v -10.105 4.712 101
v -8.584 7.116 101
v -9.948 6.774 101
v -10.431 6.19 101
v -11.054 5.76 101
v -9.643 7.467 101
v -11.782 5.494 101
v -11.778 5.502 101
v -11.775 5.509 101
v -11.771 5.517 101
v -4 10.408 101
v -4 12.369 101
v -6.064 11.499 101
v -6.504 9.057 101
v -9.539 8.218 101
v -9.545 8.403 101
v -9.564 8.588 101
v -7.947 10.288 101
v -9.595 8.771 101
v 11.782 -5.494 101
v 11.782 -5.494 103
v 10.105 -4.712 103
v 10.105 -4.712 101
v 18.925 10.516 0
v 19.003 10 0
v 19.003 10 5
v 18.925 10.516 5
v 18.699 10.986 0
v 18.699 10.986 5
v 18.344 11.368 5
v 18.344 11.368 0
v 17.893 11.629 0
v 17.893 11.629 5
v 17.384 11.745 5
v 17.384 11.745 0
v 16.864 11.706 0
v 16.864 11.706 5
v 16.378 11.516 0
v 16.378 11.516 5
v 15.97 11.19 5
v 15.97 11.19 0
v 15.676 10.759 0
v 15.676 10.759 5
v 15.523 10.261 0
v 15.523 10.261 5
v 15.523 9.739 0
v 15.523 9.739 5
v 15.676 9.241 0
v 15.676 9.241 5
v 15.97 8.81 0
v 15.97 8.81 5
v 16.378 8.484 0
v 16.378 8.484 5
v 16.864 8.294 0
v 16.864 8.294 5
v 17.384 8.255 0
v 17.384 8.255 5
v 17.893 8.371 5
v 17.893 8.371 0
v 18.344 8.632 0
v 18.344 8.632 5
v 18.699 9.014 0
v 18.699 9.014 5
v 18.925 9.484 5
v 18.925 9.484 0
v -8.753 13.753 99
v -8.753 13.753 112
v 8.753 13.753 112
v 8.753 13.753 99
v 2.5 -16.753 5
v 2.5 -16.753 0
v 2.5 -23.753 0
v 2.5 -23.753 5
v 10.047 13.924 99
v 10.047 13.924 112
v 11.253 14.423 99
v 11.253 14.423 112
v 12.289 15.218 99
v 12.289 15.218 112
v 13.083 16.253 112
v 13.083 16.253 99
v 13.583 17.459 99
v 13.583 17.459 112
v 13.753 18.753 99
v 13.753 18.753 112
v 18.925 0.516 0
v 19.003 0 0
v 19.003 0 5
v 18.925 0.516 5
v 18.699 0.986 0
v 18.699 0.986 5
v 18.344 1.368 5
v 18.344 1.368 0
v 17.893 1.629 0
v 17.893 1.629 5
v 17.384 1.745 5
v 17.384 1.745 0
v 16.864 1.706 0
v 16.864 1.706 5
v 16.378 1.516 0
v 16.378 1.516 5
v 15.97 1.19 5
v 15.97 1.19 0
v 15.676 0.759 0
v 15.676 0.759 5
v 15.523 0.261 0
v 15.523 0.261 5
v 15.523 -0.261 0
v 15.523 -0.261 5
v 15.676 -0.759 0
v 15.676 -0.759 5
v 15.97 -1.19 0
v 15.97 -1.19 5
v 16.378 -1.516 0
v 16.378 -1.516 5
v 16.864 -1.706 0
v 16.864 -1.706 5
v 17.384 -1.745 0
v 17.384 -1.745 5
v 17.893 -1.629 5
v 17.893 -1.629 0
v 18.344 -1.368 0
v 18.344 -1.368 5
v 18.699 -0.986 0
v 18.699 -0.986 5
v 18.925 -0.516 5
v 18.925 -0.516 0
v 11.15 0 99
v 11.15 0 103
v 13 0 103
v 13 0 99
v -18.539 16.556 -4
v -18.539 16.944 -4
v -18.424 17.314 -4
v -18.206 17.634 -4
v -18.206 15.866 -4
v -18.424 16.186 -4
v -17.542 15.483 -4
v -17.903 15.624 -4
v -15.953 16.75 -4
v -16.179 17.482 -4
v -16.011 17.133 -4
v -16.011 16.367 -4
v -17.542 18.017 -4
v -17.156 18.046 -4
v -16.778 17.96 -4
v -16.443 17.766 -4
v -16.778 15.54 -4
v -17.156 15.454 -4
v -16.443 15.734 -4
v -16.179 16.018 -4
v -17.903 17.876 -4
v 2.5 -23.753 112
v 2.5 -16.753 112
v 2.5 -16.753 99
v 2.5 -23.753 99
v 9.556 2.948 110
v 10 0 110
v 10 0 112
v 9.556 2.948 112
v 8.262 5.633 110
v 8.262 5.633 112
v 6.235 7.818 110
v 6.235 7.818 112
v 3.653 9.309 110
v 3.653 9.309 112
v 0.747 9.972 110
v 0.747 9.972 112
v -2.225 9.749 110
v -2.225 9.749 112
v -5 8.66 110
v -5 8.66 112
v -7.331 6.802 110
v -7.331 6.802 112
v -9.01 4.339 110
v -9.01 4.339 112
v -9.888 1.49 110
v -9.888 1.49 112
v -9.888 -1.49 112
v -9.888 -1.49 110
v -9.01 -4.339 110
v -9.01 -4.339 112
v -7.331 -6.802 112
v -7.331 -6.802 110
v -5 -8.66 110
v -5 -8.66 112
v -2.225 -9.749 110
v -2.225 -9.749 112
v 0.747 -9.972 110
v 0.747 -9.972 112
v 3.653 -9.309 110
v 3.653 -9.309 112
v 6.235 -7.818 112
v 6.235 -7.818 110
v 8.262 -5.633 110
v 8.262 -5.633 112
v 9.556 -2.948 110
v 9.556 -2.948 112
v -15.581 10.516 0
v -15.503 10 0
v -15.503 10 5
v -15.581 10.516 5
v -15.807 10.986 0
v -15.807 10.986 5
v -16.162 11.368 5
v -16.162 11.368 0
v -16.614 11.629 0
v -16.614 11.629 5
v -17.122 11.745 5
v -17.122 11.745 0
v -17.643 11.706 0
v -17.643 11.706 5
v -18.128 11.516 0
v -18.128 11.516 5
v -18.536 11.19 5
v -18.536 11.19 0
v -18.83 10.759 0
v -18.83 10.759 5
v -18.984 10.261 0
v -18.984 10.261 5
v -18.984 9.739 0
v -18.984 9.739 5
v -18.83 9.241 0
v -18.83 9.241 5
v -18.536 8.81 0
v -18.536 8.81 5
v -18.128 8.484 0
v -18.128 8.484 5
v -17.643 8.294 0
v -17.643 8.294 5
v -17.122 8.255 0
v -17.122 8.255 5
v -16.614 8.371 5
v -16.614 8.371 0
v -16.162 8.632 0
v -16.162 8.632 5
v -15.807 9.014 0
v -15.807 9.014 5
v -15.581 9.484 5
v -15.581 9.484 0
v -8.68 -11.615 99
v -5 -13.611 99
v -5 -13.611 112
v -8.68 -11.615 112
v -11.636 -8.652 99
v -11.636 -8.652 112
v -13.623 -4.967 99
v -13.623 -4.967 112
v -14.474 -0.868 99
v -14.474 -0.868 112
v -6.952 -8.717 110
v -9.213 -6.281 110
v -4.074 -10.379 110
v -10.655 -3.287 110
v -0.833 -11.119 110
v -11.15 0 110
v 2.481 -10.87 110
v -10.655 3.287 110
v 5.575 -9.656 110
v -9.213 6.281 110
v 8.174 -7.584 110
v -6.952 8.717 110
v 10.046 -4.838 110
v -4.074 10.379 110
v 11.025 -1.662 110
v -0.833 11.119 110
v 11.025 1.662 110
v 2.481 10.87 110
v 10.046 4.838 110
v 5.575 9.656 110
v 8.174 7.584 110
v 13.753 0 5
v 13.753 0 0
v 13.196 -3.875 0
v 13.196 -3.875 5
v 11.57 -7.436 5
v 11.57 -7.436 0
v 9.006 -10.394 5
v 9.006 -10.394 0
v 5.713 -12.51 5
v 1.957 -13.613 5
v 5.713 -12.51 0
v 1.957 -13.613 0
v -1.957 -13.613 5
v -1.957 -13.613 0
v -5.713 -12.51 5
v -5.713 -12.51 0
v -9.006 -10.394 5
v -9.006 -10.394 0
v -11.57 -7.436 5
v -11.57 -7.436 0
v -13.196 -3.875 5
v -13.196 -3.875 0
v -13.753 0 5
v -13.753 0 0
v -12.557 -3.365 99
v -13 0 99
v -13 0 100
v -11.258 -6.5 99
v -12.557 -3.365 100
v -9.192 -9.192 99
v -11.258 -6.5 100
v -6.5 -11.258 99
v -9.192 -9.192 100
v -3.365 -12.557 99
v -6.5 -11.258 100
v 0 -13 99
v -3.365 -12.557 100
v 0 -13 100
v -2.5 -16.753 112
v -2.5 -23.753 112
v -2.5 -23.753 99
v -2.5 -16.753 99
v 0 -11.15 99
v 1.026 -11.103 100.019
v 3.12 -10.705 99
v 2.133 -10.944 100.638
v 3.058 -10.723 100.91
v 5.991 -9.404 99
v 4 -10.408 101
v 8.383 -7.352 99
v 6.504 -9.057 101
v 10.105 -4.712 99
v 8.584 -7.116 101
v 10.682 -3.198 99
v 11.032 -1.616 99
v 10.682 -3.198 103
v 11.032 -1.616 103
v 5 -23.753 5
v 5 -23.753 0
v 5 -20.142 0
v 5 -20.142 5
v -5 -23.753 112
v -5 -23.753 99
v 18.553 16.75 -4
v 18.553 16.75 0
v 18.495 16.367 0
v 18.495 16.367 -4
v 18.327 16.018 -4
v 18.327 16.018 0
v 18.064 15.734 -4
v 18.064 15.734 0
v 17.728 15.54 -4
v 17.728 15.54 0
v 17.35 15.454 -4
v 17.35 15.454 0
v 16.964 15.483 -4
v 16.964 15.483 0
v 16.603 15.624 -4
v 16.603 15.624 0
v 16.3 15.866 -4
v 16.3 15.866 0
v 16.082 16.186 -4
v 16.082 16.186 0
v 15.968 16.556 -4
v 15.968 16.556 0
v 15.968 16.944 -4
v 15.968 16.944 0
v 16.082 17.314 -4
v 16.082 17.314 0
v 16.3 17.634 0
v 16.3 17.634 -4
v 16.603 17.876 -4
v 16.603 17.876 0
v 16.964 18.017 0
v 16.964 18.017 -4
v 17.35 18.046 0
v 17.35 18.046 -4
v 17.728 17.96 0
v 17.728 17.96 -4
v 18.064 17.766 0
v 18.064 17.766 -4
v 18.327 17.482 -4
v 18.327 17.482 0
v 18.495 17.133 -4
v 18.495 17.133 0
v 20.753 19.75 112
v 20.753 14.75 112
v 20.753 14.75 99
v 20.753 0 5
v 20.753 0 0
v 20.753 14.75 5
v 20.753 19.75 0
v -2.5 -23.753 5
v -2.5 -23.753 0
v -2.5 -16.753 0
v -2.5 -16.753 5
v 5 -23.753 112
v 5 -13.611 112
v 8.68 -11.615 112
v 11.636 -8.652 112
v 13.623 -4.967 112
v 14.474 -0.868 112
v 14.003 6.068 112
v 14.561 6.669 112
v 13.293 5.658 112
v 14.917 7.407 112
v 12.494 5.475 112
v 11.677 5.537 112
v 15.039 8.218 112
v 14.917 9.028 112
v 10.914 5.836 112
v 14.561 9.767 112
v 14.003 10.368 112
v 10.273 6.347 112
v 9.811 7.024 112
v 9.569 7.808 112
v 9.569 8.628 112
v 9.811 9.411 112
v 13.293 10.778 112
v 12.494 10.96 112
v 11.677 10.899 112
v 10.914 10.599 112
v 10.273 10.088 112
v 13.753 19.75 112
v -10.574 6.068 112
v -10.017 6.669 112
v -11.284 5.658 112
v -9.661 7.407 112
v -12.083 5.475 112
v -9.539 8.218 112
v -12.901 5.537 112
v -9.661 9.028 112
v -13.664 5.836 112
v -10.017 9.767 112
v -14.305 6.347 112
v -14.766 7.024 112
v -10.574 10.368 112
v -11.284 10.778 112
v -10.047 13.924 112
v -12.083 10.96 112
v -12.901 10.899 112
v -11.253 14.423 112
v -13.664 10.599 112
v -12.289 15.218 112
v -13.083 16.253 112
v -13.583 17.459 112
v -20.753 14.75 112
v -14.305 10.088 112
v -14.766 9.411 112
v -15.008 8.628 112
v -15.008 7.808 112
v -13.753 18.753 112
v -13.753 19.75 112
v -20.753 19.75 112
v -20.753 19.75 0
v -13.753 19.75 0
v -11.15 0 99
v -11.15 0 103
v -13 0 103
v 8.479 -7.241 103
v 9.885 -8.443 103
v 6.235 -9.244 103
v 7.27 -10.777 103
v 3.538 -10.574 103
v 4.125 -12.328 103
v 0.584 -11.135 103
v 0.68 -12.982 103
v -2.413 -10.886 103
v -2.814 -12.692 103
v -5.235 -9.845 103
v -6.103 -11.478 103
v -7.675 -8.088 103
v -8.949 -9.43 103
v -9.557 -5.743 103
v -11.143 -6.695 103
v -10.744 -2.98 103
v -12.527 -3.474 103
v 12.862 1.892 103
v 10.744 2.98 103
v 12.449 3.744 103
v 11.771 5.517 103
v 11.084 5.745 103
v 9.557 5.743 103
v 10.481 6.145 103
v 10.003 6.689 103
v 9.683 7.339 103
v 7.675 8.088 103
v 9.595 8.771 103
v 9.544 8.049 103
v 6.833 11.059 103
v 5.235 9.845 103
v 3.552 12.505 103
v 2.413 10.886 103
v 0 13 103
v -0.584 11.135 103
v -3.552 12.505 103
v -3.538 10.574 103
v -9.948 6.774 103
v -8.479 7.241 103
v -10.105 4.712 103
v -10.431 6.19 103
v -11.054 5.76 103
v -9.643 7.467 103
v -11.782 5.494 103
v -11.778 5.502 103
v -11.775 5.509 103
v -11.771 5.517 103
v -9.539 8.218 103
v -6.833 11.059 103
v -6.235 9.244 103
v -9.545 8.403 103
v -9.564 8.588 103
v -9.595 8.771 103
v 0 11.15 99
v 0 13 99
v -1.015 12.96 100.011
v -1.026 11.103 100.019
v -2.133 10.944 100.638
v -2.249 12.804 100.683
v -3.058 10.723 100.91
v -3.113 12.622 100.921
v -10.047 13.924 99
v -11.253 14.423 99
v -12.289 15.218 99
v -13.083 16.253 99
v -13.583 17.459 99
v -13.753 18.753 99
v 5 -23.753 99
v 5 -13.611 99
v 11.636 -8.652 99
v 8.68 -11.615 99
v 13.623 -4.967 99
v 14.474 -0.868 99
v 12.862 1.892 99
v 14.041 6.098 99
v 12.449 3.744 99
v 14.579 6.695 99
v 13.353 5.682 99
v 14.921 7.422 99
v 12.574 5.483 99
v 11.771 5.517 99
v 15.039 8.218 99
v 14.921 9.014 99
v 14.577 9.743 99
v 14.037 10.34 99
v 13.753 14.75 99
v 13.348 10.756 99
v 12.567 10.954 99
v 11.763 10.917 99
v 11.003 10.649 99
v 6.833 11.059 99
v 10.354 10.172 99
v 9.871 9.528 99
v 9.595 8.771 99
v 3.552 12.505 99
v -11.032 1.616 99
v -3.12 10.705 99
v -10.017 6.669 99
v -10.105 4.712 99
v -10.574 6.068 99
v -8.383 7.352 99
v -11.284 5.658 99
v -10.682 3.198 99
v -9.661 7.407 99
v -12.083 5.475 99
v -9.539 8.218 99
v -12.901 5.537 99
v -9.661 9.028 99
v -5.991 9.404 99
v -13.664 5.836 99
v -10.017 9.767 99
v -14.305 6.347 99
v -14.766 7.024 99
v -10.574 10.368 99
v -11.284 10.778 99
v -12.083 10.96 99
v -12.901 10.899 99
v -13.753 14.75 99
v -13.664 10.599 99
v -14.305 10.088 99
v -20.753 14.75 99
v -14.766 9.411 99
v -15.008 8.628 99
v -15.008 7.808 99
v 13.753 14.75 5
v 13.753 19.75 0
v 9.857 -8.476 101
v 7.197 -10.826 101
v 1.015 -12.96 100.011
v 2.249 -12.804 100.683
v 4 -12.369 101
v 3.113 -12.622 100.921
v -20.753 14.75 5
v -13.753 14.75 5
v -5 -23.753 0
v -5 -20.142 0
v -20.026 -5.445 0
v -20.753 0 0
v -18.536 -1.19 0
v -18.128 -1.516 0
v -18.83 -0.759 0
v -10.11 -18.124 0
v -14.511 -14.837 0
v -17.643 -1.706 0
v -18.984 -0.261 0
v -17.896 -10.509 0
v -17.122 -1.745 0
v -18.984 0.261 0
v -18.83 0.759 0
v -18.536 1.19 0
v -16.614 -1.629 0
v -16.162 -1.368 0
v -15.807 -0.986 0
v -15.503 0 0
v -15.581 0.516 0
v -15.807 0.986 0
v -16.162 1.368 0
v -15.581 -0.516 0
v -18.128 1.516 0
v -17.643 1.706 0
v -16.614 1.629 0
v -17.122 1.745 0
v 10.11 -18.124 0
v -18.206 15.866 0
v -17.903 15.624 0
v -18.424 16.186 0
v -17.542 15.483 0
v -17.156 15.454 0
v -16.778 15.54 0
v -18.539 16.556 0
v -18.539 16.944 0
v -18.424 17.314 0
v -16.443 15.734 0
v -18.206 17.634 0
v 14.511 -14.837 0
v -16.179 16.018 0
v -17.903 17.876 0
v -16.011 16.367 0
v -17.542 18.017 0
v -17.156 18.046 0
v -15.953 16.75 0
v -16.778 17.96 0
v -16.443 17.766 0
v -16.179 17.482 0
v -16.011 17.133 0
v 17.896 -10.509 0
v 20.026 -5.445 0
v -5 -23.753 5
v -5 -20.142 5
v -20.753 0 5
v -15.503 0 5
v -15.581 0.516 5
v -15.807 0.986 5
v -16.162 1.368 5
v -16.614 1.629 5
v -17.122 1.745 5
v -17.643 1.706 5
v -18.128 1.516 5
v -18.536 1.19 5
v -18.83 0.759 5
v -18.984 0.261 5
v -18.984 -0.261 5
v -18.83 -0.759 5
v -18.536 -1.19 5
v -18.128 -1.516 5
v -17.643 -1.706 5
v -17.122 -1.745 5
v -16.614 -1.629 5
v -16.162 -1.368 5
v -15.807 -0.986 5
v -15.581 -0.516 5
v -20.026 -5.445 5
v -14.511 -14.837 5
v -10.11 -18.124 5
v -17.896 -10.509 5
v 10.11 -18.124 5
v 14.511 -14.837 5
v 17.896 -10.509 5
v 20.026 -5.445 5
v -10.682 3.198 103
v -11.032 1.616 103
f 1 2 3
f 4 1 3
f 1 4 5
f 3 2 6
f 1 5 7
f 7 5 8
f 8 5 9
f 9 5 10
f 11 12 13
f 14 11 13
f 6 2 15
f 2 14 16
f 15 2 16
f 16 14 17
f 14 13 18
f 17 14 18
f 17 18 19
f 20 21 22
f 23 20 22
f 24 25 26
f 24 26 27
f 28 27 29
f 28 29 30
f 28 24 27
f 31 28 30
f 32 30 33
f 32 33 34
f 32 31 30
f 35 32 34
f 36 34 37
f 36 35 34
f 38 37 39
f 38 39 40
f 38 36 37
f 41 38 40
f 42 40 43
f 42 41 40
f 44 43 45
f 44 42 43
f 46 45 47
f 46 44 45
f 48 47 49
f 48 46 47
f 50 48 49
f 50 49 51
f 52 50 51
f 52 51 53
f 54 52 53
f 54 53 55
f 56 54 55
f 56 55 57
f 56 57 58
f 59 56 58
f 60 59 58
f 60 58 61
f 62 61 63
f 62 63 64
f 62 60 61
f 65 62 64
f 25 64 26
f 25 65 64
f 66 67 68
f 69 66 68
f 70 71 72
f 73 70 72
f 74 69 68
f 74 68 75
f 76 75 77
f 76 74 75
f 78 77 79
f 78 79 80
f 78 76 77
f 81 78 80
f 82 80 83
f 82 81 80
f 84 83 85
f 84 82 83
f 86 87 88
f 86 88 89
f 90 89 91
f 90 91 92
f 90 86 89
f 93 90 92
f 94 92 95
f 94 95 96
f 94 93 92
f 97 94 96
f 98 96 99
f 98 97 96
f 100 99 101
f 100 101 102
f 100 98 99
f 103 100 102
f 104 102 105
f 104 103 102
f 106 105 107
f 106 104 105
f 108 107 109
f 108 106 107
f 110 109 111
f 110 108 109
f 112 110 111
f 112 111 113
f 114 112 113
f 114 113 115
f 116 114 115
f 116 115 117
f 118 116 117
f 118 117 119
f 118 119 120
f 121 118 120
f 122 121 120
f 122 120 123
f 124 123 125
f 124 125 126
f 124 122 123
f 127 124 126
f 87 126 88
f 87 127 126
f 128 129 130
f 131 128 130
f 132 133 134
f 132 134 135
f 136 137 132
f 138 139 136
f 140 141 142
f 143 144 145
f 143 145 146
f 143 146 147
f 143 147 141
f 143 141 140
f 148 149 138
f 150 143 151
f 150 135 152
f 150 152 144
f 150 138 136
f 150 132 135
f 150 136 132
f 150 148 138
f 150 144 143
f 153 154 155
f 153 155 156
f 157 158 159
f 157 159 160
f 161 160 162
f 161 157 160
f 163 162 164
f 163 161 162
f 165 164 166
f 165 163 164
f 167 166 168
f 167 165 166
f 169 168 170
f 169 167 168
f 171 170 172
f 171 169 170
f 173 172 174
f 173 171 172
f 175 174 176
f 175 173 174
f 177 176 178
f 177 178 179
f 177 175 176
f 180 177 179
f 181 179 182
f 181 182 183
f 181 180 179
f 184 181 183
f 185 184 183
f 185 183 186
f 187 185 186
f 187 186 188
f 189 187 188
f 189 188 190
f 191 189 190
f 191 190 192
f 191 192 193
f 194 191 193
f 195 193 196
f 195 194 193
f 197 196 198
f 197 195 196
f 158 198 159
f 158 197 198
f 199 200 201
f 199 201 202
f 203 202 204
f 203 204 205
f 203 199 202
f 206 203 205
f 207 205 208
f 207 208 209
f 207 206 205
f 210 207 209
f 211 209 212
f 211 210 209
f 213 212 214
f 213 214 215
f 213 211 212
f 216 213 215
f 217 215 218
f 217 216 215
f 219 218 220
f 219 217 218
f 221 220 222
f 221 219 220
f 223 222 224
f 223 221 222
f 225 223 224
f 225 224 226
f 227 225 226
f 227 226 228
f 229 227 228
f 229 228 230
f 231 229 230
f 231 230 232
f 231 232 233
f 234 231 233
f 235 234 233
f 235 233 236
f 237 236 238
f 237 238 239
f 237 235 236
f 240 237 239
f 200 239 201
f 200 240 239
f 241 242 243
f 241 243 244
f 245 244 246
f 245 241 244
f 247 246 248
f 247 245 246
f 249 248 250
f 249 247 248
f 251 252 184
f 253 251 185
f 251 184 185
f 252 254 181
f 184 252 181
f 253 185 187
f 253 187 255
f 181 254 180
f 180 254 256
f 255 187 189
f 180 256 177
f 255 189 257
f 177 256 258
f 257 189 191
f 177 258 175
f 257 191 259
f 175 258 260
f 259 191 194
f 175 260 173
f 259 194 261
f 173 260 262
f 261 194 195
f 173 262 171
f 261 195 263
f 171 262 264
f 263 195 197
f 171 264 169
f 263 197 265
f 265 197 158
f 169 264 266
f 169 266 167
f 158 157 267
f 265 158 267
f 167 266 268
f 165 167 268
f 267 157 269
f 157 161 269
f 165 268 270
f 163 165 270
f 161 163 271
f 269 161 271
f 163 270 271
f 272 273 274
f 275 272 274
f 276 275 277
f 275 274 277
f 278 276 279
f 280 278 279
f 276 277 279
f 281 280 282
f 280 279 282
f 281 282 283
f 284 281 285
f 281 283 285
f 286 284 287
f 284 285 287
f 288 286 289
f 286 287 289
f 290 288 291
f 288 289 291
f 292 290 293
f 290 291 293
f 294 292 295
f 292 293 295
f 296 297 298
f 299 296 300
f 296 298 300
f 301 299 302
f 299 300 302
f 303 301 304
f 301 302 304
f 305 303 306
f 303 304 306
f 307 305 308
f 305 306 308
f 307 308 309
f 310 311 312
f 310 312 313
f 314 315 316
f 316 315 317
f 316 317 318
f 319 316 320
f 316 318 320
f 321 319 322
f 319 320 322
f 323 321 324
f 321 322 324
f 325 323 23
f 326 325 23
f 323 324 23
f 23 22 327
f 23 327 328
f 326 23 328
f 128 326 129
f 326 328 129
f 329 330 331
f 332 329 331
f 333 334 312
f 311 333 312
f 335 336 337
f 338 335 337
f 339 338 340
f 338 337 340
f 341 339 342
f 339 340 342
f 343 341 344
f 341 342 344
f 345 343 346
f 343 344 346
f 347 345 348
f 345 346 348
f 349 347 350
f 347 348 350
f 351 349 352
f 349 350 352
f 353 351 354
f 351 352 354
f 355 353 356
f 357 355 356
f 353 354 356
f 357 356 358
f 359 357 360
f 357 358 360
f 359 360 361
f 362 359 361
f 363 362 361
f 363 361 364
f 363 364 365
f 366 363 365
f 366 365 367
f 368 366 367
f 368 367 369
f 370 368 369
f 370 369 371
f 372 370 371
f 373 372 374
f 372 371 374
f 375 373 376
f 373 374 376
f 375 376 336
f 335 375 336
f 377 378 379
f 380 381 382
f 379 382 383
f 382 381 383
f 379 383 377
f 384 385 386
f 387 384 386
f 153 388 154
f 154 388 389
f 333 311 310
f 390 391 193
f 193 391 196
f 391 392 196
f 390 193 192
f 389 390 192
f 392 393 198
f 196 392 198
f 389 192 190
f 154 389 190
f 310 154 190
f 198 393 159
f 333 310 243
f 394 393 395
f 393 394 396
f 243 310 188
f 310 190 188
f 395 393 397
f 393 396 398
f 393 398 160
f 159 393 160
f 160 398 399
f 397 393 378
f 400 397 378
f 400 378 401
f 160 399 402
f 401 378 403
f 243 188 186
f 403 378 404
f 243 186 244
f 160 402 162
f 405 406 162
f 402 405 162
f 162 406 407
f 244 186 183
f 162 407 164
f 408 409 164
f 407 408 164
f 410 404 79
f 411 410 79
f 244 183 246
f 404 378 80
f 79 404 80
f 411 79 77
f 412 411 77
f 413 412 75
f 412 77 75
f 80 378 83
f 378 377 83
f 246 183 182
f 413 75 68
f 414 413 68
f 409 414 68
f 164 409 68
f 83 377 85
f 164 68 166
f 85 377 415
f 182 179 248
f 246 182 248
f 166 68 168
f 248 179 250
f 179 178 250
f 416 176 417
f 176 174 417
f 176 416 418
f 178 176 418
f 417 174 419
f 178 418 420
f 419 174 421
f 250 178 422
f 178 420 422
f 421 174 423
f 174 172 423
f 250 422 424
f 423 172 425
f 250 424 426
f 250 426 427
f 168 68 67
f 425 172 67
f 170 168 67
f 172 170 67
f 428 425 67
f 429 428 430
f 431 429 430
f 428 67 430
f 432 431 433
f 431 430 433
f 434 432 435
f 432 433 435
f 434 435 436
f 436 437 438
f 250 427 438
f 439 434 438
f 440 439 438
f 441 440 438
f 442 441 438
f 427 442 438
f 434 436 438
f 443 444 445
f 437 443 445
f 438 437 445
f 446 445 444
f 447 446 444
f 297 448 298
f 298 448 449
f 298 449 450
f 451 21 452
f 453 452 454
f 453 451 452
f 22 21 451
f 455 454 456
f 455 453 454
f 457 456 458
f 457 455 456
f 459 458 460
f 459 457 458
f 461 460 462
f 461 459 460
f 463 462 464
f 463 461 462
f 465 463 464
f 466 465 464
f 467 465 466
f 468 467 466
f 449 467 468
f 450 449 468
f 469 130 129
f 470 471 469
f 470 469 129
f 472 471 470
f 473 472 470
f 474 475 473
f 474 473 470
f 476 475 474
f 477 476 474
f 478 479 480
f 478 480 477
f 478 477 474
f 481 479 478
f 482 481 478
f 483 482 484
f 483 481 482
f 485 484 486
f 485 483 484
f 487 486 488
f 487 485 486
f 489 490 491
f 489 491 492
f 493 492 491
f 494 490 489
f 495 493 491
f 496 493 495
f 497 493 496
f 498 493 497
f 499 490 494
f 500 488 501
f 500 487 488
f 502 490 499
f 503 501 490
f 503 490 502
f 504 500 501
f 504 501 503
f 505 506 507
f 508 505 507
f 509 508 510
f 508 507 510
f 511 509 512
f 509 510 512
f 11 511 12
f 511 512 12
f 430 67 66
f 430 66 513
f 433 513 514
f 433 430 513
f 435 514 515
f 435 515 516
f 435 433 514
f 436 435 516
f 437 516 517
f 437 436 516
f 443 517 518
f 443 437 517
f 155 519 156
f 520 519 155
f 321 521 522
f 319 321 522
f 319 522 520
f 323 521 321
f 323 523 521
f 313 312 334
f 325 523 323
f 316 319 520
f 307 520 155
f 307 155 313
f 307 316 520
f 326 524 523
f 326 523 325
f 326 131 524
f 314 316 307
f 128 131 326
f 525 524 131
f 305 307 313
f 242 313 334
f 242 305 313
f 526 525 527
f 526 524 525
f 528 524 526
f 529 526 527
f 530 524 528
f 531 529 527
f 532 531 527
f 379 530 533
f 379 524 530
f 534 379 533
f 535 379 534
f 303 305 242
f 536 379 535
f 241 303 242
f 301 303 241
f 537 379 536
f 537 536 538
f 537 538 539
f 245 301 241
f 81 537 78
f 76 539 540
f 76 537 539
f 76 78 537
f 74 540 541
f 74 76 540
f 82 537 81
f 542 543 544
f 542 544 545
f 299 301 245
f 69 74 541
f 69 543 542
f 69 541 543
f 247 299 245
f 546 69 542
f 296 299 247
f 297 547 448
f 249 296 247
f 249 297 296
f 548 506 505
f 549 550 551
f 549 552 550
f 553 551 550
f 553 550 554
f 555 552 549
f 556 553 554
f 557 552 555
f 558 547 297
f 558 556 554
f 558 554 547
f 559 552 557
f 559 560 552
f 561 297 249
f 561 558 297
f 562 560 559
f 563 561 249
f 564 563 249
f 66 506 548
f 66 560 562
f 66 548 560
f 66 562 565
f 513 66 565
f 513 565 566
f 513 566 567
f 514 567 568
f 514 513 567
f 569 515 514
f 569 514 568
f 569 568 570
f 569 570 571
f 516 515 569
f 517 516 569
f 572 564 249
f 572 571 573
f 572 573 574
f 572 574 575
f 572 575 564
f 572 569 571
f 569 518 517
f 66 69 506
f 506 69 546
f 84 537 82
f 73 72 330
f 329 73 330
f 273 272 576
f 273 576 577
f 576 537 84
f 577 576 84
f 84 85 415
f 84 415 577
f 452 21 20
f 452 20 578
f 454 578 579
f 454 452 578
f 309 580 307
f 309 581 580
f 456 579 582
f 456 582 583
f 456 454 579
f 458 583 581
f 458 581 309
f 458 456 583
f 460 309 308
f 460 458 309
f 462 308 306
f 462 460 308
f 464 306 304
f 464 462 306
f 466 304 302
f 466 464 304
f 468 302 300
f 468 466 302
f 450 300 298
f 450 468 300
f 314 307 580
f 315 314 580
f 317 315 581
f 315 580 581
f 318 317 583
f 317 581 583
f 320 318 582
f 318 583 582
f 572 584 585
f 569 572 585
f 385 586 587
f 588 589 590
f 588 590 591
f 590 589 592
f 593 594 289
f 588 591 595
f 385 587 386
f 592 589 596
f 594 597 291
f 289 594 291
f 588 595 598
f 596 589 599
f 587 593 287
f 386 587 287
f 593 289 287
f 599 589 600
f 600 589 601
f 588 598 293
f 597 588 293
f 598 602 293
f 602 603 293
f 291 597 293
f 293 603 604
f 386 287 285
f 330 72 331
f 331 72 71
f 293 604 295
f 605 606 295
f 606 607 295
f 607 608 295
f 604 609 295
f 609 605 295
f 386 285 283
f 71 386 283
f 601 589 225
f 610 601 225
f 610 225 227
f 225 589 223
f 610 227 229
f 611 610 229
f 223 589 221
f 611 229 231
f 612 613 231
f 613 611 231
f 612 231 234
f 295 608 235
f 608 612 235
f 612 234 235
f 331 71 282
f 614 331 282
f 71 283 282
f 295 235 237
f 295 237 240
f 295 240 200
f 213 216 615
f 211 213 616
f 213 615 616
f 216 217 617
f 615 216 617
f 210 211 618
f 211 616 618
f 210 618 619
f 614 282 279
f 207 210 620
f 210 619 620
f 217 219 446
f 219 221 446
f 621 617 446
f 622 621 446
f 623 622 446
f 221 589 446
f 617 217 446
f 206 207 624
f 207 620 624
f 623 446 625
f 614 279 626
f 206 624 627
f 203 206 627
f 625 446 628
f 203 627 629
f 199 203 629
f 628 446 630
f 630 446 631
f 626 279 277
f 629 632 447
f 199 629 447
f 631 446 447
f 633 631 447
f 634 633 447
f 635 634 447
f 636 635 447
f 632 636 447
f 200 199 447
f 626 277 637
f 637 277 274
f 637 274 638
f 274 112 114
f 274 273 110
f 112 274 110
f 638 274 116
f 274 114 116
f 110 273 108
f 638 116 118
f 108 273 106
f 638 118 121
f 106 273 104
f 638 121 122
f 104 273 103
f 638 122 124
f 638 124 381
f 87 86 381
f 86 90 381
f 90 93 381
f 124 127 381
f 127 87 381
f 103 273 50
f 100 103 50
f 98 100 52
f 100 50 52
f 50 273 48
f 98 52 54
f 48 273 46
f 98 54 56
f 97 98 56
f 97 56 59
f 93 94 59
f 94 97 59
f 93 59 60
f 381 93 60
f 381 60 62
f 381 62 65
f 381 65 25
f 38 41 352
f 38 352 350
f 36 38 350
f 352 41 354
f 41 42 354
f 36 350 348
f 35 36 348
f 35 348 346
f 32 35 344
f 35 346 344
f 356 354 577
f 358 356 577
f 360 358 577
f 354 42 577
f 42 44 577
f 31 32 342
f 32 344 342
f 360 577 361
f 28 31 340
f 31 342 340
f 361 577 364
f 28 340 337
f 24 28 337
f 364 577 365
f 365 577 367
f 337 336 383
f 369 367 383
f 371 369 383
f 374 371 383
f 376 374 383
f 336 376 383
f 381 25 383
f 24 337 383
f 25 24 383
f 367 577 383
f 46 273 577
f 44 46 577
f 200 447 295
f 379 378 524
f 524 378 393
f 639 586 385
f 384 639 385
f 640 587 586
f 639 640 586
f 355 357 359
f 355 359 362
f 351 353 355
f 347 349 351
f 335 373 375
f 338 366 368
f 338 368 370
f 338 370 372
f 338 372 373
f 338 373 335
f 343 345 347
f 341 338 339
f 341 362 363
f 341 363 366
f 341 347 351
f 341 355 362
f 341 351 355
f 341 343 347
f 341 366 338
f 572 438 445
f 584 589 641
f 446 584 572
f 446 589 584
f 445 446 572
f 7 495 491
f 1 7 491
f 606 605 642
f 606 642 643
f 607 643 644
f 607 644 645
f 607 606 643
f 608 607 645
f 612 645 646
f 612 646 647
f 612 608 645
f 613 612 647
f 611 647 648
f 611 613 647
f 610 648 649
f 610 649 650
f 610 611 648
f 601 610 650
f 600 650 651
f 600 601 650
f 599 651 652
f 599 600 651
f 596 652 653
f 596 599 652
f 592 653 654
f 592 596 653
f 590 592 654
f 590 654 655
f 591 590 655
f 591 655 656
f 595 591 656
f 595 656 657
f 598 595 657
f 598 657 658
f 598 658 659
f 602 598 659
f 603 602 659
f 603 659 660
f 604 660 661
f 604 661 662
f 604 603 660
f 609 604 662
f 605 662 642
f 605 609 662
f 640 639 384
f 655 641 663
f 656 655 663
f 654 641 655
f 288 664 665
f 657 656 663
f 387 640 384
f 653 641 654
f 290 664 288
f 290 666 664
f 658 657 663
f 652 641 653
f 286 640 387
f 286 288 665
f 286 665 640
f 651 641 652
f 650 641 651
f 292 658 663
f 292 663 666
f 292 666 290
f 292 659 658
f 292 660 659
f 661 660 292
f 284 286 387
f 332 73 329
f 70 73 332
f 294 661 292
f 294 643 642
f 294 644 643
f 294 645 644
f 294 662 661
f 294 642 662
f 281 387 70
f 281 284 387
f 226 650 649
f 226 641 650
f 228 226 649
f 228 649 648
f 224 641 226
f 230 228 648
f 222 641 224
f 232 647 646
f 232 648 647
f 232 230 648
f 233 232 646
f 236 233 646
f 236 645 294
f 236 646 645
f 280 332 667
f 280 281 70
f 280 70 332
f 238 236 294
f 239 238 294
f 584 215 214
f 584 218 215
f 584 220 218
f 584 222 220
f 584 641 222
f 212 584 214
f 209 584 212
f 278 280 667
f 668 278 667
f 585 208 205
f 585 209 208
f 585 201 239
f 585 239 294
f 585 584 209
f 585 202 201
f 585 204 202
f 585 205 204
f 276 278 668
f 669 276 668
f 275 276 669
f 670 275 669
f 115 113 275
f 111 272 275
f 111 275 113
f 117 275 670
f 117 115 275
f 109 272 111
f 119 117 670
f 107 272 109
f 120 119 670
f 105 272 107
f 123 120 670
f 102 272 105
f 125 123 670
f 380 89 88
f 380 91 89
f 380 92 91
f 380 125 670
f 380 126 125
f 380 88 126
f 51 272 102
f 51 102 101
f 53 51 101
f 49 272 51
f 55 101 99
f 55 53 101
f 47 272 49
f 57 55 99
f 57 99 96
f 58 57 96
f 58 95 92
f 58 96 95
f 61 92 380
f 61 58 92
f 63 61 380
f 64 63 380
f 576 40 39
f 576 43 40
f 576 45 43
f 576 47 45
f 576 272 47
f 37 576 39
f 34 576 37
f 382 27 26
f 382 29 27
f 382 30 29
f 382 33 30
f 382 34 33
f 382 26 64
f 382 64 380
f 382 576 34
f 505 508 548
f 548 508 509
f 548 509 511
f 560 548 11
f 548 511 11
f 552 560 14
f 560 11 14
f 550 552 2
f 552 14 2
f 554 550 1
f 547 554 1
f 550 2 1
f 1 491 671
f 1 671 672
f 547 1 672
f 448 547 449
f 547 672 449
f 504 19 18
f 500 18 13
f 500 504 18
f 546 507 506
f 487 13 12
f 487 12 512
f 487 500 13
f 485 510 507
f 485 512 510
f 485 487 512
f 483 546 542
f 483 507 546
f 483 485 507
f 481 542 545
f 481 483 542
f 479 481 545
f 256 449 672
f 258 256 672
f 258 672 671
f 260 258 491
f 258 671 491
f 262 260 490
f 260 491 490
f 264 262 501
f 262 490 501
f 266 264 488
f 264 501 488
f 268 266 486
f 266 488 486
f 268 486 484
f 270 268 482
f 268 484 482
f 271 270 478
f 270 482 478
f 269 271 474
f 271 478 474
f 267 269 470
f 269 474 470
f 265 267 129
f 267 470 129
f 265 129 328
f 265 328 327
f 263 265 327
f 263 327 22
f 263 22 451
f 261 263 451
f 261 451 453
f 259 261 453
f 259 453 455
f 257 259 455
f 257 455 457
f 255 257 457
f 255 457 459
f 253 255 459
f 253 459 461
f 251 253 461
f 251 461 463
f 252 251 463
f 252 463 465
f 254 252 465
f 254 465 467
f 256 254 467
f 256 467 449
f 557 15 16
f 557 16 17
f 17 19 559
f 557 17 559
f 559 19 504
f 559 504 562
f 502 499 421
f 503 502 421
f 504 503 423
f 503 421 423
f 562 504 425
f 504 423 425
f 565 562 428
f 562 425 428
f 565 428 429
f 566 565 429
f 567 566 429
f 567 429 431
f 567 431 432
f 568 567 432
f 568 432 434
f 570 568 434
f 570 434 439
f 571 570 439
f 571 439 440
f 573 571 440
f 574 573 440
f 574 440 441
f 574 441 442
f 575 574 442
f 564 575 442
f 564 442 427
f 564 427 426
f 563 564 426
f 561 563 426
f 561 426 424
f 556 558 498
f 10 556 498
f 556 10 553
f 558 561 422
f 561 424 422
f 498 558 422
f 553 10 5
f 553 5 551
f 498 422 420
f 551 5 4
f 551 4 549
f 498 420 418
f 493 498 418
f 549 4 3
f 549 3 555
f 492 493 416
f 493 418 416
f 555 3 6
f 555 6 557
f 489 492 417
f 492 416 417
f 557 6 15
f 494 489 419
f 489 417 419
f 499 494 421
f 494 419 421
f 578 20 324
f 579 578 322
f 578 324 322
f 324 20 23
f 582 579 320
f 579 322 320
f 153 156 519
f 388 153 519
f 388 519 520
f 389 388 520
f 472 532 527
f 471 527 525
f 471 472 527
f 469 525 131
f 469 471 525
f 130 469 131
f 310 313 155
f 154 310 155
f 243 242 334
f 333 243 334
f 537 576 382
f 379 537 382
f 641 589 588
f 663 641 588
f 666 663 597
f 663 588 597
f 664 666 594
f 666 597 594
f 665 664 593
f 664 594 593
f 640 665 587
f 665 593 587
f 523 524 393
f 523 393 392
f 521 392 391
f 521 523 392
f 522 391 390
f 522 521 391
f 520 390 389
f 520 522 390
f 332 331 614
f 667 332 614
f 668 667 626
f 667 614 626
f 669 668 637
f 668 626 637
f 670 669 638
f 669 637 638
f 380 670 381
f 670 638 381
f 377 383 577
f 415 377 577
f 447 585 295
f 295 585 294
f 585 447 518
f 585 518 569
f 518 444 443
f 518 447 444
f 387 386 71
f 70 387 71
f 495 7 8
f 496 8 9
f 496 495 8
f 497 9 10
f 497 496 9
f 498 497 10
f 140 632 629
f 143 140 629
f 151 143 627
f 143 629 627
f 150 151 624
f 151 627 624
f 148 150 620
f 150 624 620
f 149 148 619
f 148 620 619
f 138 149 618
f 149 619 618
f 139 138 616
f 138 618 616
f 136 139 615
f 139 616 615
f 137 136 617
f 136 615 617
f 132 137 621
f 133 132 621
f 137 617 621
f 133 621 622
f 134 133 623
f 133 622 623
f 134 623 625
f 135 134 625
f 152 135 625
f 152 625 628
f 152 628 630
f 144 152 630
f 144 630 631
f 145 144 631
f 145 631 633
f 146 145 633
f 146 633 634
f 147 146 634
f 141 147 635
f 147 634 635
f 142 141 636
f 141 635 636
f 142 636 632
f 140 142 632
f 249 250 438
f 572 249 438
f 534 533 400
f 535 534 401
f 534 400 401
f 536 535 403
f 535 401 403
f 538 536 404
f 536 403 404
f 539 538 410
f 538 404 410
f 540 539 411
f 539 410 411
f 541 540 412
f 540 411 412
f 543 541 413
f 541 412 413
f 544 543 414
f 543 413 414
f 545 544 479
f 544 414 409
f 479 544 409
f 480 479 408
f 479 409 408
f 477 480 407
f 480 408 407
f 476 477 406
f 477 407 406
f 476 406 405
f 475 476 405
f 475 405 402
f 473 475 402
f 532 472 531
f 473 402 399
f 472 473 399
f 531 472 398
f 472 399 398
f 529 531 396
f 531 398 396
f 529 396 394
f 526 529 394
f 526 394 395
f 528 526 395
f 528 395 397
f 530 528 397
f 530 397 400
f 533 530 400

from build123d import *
from build123d.topology import SkipClean

# Parameters (mm, degrees)
SKETCH2_R            = 1.75
BOSS_EXTRUDE1_DEPTH  = 5
SKETCH3_R            = 1.3
BOSS_EXTRUDE2_DEPTH  = 4
SKETCH4_W            = 7
SKETCH4_H            = 5
BOSS_EXTRUDE3_DEPTH  = 107
BOSS_EXTRUDE4_START  = -2
SKETCH5_R            = 13.753194099
SKETCH5_R_2          = 10
SKETCH5_W            = 7
SKETCH5_H            = 5
BOSS_EXTRUDE4_DEPTH  = 2
BOSS_EXTRUDE5_START  = 10
SKETCH6_R            = 11.15
BOSS_EXTRUDE5_DEPTH  = 10
CUT_EXTRUDE1_START   = -3
SKETCH7_R            = 13
CUT_EXTRUDE1_DEPTH   = 3
BOSS_EXTRUDE6_DEPTH  = 3
BOSS_EXTRUDE7_DEPTH  = 1
BOSS_EXTRUDE8_START  = -2
BOSS_EXTRUDE8_DEPTH  = 2
FILLET1_R            = 5
BOSS_EXTRUDE9_START  = -13
BOSS_EXTRUDE9_DEPTH  = 13
FILLET3_R            = 5
SKETCH13_R           = 2.75
CUT_EXTRUDE2_DEPTH   = 15
BOSS_EXTRUDE10_DEPTH = 13


with BuildPart() as part:
    # Sketch2 → Boss-Extrude1 (new body)
    with BuildSketch(Plane.XY):
        with BuildLine():
            Line((-2.5, -23.753194099), (-2.5, -16.753194099))
            Line((-2.5, -16.753194099), (2.5, -16.753194099))
            Line((2.5, -16.753194099), (2.5, -23.753194099))
            Line((2.5, -23.753194099), (5, -23.753194099))
            Line((5, -23.753194099), (5, -20.141873431))
            ThreePointArc((5, -20.141873431), (16.34718685, -12.785325472), (20.753194099, 0))
            Line((20.753194099, 0), (20.753194099, 19.75))
            Line((20.753194099, 19.75), (13.753194099, 19.75))
            Line((13.753194099, 19.75), (13.753194099, 0))
            ThreePointArc((13.753194099, 0), (0, -13.753194099), (-13.753194099, 0))
            Line((-13.753194099, 0), (-13.753194099, 19.75))
            Line((-13.753194099, 19.75), (-20.753194099, 19.75))
            Line((-20.753194099, 19.75), (-20.753194099, 0))
            ThreePointArc((-20.753194099, 0), (-16.34718685, -12.785325472), (-5, -20.141873431))
            Line((-5, -20.141873431), (-5, -23.753194099))
            Line((-5, -23.753194099), (-2.5, -23.753194099))
        make_face()
        with Locations((17.253194099, 10)):
            Circle(SKETCH2_R, mode=Mode.SUBTRACT)
        with Locations((17.253194099, 0)):
            Circle(SKETCH2_R, mode=Mode.SUBTRACT)
        with Locations((-17.253194099, 0)):
            Circle(SKETCH2_R, mode=Mode.SUBTRACT)
        with Locations((-17.253194099, 10)):
            Circle(SKETCH2_R, mode=Mode.SUBTRACT)
    extrude(amount=BOSS_EXTRUDE1_DEPTH)

    # Sketch3 → Boss-Extrude2 (add)
    with BuildSketch(Plane(origin=(0, 0, 0), x_dir=(-1, 0, 0), z_dir=(0, 0, -1))):
        with Locations(Location((17.253194099, 16.75, 0), (0, 0, 180))):
            Circle(SKETCH3_R)
        with Locations(Location((-17.253194099, 16.75, 0), (0, 0, 180))):
            Circle(SKETCH3_R)
    extrude(amount=BOSS_EXTRUDE2_DEPTH)

    # Sketch4 → Boss-Extrude3 (add)
    with BuildSketch(Plane.XY.offset(5)):
        with Locations((-17.253194099, 17.25)):
            Rectangle(SKETCH4_W, SKETCH4_H)
        with Locations((17.253194099, 17.25)):
            Rectangle(SKETCH4_W, SKETCH4_H)
    extrude(amount=BOSS_EXTRUDE3_DEPTH)

    # Sketch5 → Boss-Extrude4 (add)
    # profile 1 of 6: a face of its own
    with BuildSketch(Plane.XY.offset(112).offset(BOSS_EXTRUDE4_START)):
        with BuildLine():
            Line((0, 13.753194099), (-13.753194099, 13.753194099))
            Line((-13.753194099, 13.753194099), (-13.753194099, 0))
            ThreePointArc((-13.753194099, 0), (-9.724976811, 9.724976811), (0, 13.753194099))
        make_face()
    # profile 2 of 6: a face of its own
    with BuildSketch(Plane.XY.offset(112).offset(BOSS_EXTRUDE4_START)):
        Circle(SKETCH5_R)
        Circle(SKETCH5_R_2, mode=Mode.SUBTRACT)
    # profile 3 of 6: a face of its own
    with BuildSketch(Plane.XY.offset(112).offset(BOSS_EXTRUDE4_START)):
        with BuildLine():
            Line((13.753194099, 14.75), (13.753194099, 13.753194099))
            Line((13.753194099, 13.753194099), (13.753194099, 0))
            ThreePointArc((13.753194099, 0), (13.502745228, -2.612703434), (12.76052008, -5.13025099))
            Line((12.76052008, -5.13025099), (20.753194099, 14.75))
            Line((20.753194099, 14.75), (13.753194099, 14.75))
        make_face()
    # profile 4 of 6: a face of its own
    with BuildSketch(Plane.XY.offset(112).offset(BOSS_EXTRUDE4_START)):
        with Locations((17.253194099, 17.25)):
            Rectangle(SKETCH5_W, SKETCH5_H)
    # profile 5 of 6: a face of its own
    with BuildSketch(Plane.XY.offset(112).offset(BOSS_EXTRUDE4_START)):
        with BuildLine():
            Line((13.753194099, 13.753194099), (0, 13.753194099))
            ThreePointArc((0, 13.753194099), (9.724976811, 9.724976811), (13.753194099, 0))
            Line((13.753194099, 0), (13.753194099, 13.753194099))
        make_face()
    # profile 6 of 6: a face of its own
    with BuildSketch(Plane.XY.offset(112).offset(BOSS_EXTRUDE4_START)):
        with BuildLine():
            Line((-13.753194099, 13.753194099), (-13.753194099, 19.75))
            Line((-13.753194099, 19.75), (-20.753194099, 19.75))
            Line((-20.753194099, 19.75), (-20.753194099, 14.75))
            Line((-20.753194099, 14.75), (-12.76052008, -5.13025099))
            ThreePointArc((-12.76052008, -5.13025099), (-13.502745228, -2.612703434), (-13.753194099, 0))
            Line((-13.753194099, 0), (-13.753194099, 13.753194099))
        make_face()
    extrude(amount=BOSS_EXTRUDE4_DEPTH)

    # Sketch6 → Boss-Extrude5 (add)
    # profile 1 of 3: a face of its own
    with BuildSketch(Plane(origin=(0, 0, 110), x_dir=(-1, 0, 0), z_dir=(0, 0, -1)).offset(BOSS_EXTRUDE5_START)):
        with BuildLine():
            ThreePointArc((13.753194099, 0), (13.502745228, -2.612703434), (12.76052008, -5.13025099))
            Line((12.76052008, -5.13025099), (20.753194099, 14.75))
            Line((20.753194099, 14.75), (13.753194099, 14.75))
            Line((13.753194099, 14.75), (13.753194099, 13.753194099))
            Line((13.753194099, 13.753194099), (0, 13.753194099))
            ThreePointArc((0, 13.753194099), (9.724976811, 9.724976811), (13.753194099, 0))
        make_face()
    # profile 2 of 3: a face of its own
    with BuildSketch(Plane(origin=(0, 0, 110), x_dir=(-1, 0, 0), z_dir=(0, 0, -1)).offset(BOSS_EXTRUDE5_START)):
        with BuildLine():
            Line((-20.753194099, 14.75), (-12.76052008, -5.13025099))
            ThreePointArc((-12.76052008, -5.13025099), (-11.395343031, 7.700422401), (0, 13.753194099))
            Line((0, 13.753194099), (-13.753194099, 13.753194099))
            Line((-13.753194099, 13.753194099), (-13.753194099, 14.75))
            Line((-13.753194099, 14.75), (-20.753194099, 14.75))
        make_face()
    # profile 3 of 3: a face of its own
    with BuildSketch(Plane(origin=(0, 0, 110), x_dir=(-1, 0, 0), z_dir=(0, 0, -1)).offset(BOSS_EXTRUDE5_START)):
        with BuildLine():
            ThreePointArc((-12.76052008, -5.13025099), (0, -13.753194099), (12.76052008, -5.13025099))
            ThreePointArc((12.76052008, -5.13025099), (13.502745228, -2.612703434), (13.753194099, 0))
            ThreePointArc((13.753194099, 0), (9.724976811, 9.724976811), (0, 13.753194099))
            ThreePointArc((0, 13.753194099), (-11.395343031, 7.700422401), (-12.76052008, -5.13025099))
        make_face()
        Circle(SKETCH6_R, mode=Mode.SUBTRACT)
    extrude(amount=-BOSS_EXTRUDE5_DEPTH)

    # Sketch7 → Cut-Extrude1 (cut)
    with BuildSketch(Plane(origin=(0, 0, 100), x_dir=(-1, 0, 0), z_dir=(0, 0, -1)).offset(CUT_EXTRUDE1_START)):
        Circle(SKETCH7_R)
    extrude(amount=CUT_EXTRUDE1_DEPTH, mode=Mode.SUBTRACT)

    # Sketch8 → Boss-Extrude6 (add)
    with SkipClean():  # the faces are left unmerged after this step: merging them gives an invalid solid
        with BuildSketch(Plane(origin=(0, 0, 103), x_dir=(-1, 0, 0), z_dir=(0, 0, -1))):
            with BuildLine():
                ThreePointArc((10.105331825, 4.712193618), (10.885700479, 2.413301695), (11.15, 0))
                Line((11.15, 0), (13, 0))
                ThreePointArc((13, 0), (12.691848093, 2.813714981), (11.782001231, 5.494037403))
                Line((11.782001231, 5.494037403), (10.105331825, 4.712193618))
            make_face()
            with BuildLine():
                ThreePointArc((-10.105331825, -4.712193618), (-10.885700479, -2.413301695), (-11.15, 0))
                Line((-11.15, 0), (-13, 0))
                ThreePointArc((-13, 0), (-12.691848093, -2.813714981), (-11.782001231, -5.494037403))
                Line((-11.782001231, -5.494037403), (-10.105331825, -4.712193618))
            make_face()
        extrude(amount=BOSS_EXTRUDE6_DEPTH)

    # Sketch9 → Boss-Extrude7 (add)
    with BuildSketch(Plane(origin=(0, 0, 100), x_dir=(-1, 0, 0), z_dir=(0, 0, -1))):
        with BuildLine():
            Line((13.753194099, 13.753194099), (-13.753194099, 13.753194099))
            Line((-13.753194099, 13.753194099), (-13.753194099, 14.75))
            Line((-13.753194099, 14.75), (-20.753194099, 14.75))
            Line((-20.753194099, 14.75), (-12.76052008, -5.13025099))
            ThreePointArc((-12.76052008, -5.13025099), (0, -13.753194099), (12.76052008, -5.13025099))
            Line((12.76052008, -5.13025099), (20.753194099, 14.75))
            Line((20.753194099, 14.75), (13.753194099, 14.75))
            Line((13.753194099, 14.75), (13.753194099, 13.753194099))
        make_face()
        with BuildLine():
            Line((-11.15, 0), (-13, 0))
            ThreePointArc((-13, 0), (-2.813714981, 12.691848093), (11.782001231, 5.494037403))
            Line((11.782001231, 5.494037403), (10.105331825, 4.712193618))
            ThreePointArc((10.105331825, 4.712193618), (10.885700479, 2.413301695), (11.15, 0))
            Line((11.15, 0), (13, 0))
            ThreePointArc((13, 0), (2.813714981, -12.691848093), (-11.782001231, -5.494037403))
            Line((-11.782001231, -5.494037403), (-10.105331825, -4.712193618))
            ThreePointArc((-10.105331825, -4.712193618), (-10.885700479, -2.413301695), (-11.15, 0))
        make_face(mode=Mode.SUBTRACT)
    extrude(amount=BOSS_EXTRUDE7_DEPTH)

    # Sketch10 → Boss-Extrude8 (add)
    with BuildSketch(Plane(origin=(0, 0, 99), x_dir=(-1, 0, 0), z_dir=(0, 0, -1)).offset(BOSS_EXTRUDE8_START)):
        with BuildLine():
            Line((0, 13), (0, 11.15))
            ThreePointArc((0, 11.15), (5.990890633, 9.403814621), (10.105331825, 4.712193618))
            Line((10.105331825, 4.712193618), (11.782001231, 5.494037403))
            ThreePointArc((11.782001231, 5.494037403), (6.984894909, 10.964088796), (0, 13))
        make_face()
        with BuildLine():
            Line((0, -13), (0, -11.15))
            ThreePointArc((0, -11.15), (-5.990890633, -9.403814621), (-10.105331825, -4.712193618))
            Line((-10.105331825, -4.712193618), (-11.782001231, -5.494037403))
            ThreePointArc((-11.782001231, -5.494037403), (-6.984894909, -10.964088796), (0, -13))
        make_face()
    extrude(amount=BOSS_EXTRUDE8_DEPTH)

    # Fillet1
    # the kernel refuses this fillet: 5 mm, written as the material it takes off along each edge
    with BuildSketch(Plane(origin=(0, -23, 101), x_dir=(0, 0, -1), z_dir=(0, 1, 0))) as fillet1_piece_1_section:
        with BuildLine():
            CenterArc((5, -4), FILLET1_R, 126.869897646, 53.130102354)
            Line((0, -4), (0, 0))
            Line((0, 0), (2, 0))
        make_face()
    fillet1_piece_1 = extrude(amount=21.85, mode=Mode.PRIVATE)
    fillet1_piece_1 = fillet1_piece_1 & Plane(origin=(0, 0, 100.481080227), x_dir=(-1, 0, 0), z_dir=(0, 0, 1)) * Cylinder(13, 60, mode=Mode.PRIVATE)
    add(fillet1_piece_1, mode=Mode.SUBTRACT)
    with BuildSketch(Plane(origin=(0, 23, 101), x_dir=(0, 0, -1), z_dir=(0, -1, 0))) as fillet1_piece_2_section:
        with BuildLine():
            CenterArc((5, -4), FILLET1_R, 126.869897646, 53.130102354)
            Line((0, -4), (0, 0))
            Line((0, 0), (2, 0))
        make_face()
    fillet1_piece_2 = extrude(amount=21.85, mode=Mode.PRIVATE)
    fillet1_piece_2 = fillet1_piece_2 & Plane(origin=(0, 0, 100.481080227), x_dir=(1, 0, 0), z_dir=(0, 0, 1)) * Cylinder(13, 60, mode=Mode.PRIVATE)
    add(fillet1_piece_2, mode=Mode.SUBTRACT)

    # Sketch11 → Boss-Extrude9 (add)
    with BuildSketch(Plane.XY.offset(112).offset(BOSS_EXTRUDE9_START)):
        with BuildLine():
            Line((2.5, -16.753194099), (2.5, -23.753194099))
            Line((2.5, -23.753194099), (5, -23.753194099))
            Line((5, -23.753194099), (5, -12.812117231))
            ThreePointArc((5, -12.812117231), (0, -13.753194099), (-5, -12.812117231))
            Line((-5, -12.812117231), (-5, -23.753194099))
            Line((-5, -23.753194099), (-2.5, -23.753194099))
            Line((-2.5, -23.753194099), (-2.5, -16.753194099))
            Line((-2.5, -16.753194099), (2.5, -16.753194099))
        make_face()
    extrude(amount=BOSS_EXTRUDE9_DEPTH)

    # Fillet3
    # the kernel refuses this fillet: 5 mm, written as the material it adds along each edge
    with BuildSketch(Plane(origin=(13.753194099, 13.753194099, 99), x_dir=(0, 1, 0), z_dir=(0, 0, 1)), Plane(origin=(-13.753194099, 13.753194099, 112), x_dir=(0, 1, 0), z_dir=(0, 0, -1))) as fillet3_piece_1:
        with BuildLine():
            CenterArc((FILLET3_R, FILLET3_R), FILLET3_R, 180, 90)
            Line((0, FILLET3_R), (0, 0))
            Line((0, 0), (FILLET3_R, 0))
        make_face()
    extrude(amount=13)

    # Sketch13 → Cut-Extrude2 (cut)
    with BuildSketch(Plane.XY.offset(112)):
        with Locations((-12.288728005, 8.217660193)):
            Circle(SKETCH13_R)
        with Locations((12.288728005, 8.217660193)):
            Circle(SKETCH13_R)
    extrude(amount=-CUT_EXTRUDE2_DEPTH, mode=Mode.SUBTRACT)

    # Sketch14 → Boss-Extrude10 (add)
    with BuildSketch(Plane(origin=(0, 0, 99), x_dir=(-1, 0, 0), z_dir=(0, 0, -1))):
        with BuildLine():
            ThreePointArc((5, -13.610657589), (11.636170752, -8.6515623), (14.473975018, -0.868358893))
            Line((14.473975018, -0.868358893), (12.76052008, -5.13025099))
            ThreePointArc((12.76052008, -5.13025099), (9.675318373, -9.774382964), (5, -12.812117231))
            Line((5, -12.812117231), (5, -13.610657589))
        make_face()
        with BuildLine():
            Line((-5, -12.812117231), (-5, -13.610657589))
            ThreePointArc((-5, -13.610657589), (0, -14.5), (5, -13.610657589))
            Line((5, -13.610657589), (5, -12.812117231))
            ThreePointArc((5, -12.812117231), (0, -13.753194099), (-5, -12.812117231))
        make_face()
        with BuildLine():
            Line((-12.76052008, -5.13025099), (-14.473975018, -0.868358893))
            ThreePointArc((-14.473975018, -0.868358893), (-11.636170752, -8.6515623), (-5, -13.610657589))
            Line((-5, -13.610657589), (-5, -12.812117231))
            ThreePointArc((-5, -12.812117231), (-9.675318373, -9.774382964), (-12.76052008, -5.13025099))
        make_face()
    extrude(amount=-BOSS_EXTRUDE10_DEPTH)


solid = part.part
